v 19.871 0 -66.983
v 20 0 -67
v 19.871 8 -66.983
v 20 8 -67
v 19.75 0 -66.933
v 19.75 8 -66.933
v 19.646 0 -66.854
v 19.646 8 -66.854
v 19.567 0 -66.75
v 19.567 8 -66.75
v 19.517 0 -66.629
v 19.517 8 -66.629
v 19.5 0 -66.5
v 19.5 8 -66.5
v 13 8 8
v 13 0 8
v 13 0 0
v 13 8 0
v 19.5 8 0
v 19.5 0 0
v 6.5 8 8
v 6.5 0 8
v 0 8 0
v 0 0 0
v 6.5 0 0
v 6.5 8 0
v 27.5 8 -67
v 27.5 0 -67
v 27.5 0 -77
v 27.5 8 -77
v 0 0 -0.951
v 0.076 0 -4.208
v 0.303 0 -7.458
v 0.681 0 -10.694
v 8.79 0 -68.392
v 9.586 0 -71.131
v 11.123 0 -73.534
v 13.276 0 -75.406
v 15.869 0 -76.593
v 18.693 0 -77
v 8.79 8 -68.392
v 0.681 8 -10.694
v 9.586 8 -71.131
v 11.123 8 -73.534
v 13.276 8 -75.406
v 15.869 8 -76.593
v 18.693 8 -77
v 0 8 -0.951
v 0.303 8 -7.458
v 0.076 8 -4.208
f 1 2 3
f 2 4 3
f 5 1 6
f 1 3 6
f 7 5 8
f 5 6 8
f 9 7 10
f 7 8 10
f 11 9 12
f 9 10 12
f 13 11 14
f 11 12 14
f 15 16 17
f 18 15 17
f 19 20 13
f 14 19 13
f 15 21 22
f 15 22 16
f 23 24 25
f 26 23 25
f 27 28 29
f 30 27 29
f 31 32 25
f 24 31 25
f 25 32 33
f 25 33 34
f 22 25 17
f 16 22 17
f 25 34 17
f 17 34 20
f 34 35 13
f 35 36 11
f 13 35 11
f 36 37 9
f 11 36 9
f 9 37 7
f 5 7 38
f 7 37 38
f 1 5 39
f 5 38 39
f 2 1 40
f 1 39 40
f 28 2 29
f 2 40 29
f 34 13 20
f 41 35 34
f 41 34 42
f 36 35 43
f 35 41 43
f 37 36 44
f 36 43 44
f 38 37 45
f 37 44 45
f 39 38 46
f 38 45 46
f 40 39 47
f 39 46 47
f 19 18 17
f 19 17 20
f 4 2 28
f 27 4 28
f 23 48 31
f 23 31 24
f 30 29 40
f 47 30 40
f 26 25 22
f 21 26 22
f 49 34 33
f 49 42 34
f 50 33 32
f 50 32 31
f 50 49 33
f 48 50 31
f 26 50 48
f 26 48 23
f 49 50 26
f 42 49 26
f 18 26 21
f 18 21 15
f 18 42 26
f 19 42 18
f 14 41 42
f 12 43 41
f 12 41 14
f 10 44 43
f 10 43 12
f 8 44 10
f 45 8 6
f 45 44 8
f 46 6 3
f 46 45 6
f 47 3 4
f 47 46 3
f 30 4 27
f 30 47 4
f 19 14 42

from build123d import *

# Parameters (mm, degrees)
BOSS_EXTRUDE1_DEPTH = 8
CHAMFER1_SIZE       = 10
CHAMFER1_SIZE2      = 71.153697224
FILLET1_R           = 10
FILLET2_R           = 70
FILLET3_R           = 0.5


with BuildPart() as part:
    # Sketch1 → Boss-Extrude1 (new body)
    with BuildSketch(Plane(origin=(0, 0, 0), x_dir=(1, 0, 0), z_dir=(0, 1, 0))):
        Polygon((0, 77), (0, 0), (6.5, 0), (6.5, -8), (13, -8), (13, 0), (19.5, 0), (19.5, 67), (27.5, 67), (27.5, 77), align=None)
    extrude(amount=BOSS_EXTRUDE1_DEPTH)

    # Chamfer1
    chamfer1_edges = [part.edges().sort_by_distance(p)[0] for p in [
        (0, 4, -77),
    ]]
    chamfer1_side = [part.faces().sort_by_distance(p)[0] for p in [
        (13.75, 4, -77),
    ]]
    chamfer(chamfer1_edges, length=CHAMFER1_SIZE, length2=CHAMFER1_SIZE2, reference=chamfer1_side[0])

    # Fillet1
    fillet1_edges = [part.edges().sort_by_distance(p)[0] for p in [
        (10, 4, -77),
    ]]
    fillet(fillet1_edges, radius=FILLET1_R)

    # Fillet2
    fillet2_edges = [part.edges().sort_by_distance(p)[0] for p in [
        (0, 4, -5.846302776),
    ]]
    fillet(fillet2_edges, radius=FILLET2_R)

    # Fillet3
    fillet3_edges = [part.edges().sort_by_distance(p)[0] for p in [
        (19.5, 4, -67),
    ]]
    fillet(fillet3_edges, radius=FILLET3_R)


solid = part.part
